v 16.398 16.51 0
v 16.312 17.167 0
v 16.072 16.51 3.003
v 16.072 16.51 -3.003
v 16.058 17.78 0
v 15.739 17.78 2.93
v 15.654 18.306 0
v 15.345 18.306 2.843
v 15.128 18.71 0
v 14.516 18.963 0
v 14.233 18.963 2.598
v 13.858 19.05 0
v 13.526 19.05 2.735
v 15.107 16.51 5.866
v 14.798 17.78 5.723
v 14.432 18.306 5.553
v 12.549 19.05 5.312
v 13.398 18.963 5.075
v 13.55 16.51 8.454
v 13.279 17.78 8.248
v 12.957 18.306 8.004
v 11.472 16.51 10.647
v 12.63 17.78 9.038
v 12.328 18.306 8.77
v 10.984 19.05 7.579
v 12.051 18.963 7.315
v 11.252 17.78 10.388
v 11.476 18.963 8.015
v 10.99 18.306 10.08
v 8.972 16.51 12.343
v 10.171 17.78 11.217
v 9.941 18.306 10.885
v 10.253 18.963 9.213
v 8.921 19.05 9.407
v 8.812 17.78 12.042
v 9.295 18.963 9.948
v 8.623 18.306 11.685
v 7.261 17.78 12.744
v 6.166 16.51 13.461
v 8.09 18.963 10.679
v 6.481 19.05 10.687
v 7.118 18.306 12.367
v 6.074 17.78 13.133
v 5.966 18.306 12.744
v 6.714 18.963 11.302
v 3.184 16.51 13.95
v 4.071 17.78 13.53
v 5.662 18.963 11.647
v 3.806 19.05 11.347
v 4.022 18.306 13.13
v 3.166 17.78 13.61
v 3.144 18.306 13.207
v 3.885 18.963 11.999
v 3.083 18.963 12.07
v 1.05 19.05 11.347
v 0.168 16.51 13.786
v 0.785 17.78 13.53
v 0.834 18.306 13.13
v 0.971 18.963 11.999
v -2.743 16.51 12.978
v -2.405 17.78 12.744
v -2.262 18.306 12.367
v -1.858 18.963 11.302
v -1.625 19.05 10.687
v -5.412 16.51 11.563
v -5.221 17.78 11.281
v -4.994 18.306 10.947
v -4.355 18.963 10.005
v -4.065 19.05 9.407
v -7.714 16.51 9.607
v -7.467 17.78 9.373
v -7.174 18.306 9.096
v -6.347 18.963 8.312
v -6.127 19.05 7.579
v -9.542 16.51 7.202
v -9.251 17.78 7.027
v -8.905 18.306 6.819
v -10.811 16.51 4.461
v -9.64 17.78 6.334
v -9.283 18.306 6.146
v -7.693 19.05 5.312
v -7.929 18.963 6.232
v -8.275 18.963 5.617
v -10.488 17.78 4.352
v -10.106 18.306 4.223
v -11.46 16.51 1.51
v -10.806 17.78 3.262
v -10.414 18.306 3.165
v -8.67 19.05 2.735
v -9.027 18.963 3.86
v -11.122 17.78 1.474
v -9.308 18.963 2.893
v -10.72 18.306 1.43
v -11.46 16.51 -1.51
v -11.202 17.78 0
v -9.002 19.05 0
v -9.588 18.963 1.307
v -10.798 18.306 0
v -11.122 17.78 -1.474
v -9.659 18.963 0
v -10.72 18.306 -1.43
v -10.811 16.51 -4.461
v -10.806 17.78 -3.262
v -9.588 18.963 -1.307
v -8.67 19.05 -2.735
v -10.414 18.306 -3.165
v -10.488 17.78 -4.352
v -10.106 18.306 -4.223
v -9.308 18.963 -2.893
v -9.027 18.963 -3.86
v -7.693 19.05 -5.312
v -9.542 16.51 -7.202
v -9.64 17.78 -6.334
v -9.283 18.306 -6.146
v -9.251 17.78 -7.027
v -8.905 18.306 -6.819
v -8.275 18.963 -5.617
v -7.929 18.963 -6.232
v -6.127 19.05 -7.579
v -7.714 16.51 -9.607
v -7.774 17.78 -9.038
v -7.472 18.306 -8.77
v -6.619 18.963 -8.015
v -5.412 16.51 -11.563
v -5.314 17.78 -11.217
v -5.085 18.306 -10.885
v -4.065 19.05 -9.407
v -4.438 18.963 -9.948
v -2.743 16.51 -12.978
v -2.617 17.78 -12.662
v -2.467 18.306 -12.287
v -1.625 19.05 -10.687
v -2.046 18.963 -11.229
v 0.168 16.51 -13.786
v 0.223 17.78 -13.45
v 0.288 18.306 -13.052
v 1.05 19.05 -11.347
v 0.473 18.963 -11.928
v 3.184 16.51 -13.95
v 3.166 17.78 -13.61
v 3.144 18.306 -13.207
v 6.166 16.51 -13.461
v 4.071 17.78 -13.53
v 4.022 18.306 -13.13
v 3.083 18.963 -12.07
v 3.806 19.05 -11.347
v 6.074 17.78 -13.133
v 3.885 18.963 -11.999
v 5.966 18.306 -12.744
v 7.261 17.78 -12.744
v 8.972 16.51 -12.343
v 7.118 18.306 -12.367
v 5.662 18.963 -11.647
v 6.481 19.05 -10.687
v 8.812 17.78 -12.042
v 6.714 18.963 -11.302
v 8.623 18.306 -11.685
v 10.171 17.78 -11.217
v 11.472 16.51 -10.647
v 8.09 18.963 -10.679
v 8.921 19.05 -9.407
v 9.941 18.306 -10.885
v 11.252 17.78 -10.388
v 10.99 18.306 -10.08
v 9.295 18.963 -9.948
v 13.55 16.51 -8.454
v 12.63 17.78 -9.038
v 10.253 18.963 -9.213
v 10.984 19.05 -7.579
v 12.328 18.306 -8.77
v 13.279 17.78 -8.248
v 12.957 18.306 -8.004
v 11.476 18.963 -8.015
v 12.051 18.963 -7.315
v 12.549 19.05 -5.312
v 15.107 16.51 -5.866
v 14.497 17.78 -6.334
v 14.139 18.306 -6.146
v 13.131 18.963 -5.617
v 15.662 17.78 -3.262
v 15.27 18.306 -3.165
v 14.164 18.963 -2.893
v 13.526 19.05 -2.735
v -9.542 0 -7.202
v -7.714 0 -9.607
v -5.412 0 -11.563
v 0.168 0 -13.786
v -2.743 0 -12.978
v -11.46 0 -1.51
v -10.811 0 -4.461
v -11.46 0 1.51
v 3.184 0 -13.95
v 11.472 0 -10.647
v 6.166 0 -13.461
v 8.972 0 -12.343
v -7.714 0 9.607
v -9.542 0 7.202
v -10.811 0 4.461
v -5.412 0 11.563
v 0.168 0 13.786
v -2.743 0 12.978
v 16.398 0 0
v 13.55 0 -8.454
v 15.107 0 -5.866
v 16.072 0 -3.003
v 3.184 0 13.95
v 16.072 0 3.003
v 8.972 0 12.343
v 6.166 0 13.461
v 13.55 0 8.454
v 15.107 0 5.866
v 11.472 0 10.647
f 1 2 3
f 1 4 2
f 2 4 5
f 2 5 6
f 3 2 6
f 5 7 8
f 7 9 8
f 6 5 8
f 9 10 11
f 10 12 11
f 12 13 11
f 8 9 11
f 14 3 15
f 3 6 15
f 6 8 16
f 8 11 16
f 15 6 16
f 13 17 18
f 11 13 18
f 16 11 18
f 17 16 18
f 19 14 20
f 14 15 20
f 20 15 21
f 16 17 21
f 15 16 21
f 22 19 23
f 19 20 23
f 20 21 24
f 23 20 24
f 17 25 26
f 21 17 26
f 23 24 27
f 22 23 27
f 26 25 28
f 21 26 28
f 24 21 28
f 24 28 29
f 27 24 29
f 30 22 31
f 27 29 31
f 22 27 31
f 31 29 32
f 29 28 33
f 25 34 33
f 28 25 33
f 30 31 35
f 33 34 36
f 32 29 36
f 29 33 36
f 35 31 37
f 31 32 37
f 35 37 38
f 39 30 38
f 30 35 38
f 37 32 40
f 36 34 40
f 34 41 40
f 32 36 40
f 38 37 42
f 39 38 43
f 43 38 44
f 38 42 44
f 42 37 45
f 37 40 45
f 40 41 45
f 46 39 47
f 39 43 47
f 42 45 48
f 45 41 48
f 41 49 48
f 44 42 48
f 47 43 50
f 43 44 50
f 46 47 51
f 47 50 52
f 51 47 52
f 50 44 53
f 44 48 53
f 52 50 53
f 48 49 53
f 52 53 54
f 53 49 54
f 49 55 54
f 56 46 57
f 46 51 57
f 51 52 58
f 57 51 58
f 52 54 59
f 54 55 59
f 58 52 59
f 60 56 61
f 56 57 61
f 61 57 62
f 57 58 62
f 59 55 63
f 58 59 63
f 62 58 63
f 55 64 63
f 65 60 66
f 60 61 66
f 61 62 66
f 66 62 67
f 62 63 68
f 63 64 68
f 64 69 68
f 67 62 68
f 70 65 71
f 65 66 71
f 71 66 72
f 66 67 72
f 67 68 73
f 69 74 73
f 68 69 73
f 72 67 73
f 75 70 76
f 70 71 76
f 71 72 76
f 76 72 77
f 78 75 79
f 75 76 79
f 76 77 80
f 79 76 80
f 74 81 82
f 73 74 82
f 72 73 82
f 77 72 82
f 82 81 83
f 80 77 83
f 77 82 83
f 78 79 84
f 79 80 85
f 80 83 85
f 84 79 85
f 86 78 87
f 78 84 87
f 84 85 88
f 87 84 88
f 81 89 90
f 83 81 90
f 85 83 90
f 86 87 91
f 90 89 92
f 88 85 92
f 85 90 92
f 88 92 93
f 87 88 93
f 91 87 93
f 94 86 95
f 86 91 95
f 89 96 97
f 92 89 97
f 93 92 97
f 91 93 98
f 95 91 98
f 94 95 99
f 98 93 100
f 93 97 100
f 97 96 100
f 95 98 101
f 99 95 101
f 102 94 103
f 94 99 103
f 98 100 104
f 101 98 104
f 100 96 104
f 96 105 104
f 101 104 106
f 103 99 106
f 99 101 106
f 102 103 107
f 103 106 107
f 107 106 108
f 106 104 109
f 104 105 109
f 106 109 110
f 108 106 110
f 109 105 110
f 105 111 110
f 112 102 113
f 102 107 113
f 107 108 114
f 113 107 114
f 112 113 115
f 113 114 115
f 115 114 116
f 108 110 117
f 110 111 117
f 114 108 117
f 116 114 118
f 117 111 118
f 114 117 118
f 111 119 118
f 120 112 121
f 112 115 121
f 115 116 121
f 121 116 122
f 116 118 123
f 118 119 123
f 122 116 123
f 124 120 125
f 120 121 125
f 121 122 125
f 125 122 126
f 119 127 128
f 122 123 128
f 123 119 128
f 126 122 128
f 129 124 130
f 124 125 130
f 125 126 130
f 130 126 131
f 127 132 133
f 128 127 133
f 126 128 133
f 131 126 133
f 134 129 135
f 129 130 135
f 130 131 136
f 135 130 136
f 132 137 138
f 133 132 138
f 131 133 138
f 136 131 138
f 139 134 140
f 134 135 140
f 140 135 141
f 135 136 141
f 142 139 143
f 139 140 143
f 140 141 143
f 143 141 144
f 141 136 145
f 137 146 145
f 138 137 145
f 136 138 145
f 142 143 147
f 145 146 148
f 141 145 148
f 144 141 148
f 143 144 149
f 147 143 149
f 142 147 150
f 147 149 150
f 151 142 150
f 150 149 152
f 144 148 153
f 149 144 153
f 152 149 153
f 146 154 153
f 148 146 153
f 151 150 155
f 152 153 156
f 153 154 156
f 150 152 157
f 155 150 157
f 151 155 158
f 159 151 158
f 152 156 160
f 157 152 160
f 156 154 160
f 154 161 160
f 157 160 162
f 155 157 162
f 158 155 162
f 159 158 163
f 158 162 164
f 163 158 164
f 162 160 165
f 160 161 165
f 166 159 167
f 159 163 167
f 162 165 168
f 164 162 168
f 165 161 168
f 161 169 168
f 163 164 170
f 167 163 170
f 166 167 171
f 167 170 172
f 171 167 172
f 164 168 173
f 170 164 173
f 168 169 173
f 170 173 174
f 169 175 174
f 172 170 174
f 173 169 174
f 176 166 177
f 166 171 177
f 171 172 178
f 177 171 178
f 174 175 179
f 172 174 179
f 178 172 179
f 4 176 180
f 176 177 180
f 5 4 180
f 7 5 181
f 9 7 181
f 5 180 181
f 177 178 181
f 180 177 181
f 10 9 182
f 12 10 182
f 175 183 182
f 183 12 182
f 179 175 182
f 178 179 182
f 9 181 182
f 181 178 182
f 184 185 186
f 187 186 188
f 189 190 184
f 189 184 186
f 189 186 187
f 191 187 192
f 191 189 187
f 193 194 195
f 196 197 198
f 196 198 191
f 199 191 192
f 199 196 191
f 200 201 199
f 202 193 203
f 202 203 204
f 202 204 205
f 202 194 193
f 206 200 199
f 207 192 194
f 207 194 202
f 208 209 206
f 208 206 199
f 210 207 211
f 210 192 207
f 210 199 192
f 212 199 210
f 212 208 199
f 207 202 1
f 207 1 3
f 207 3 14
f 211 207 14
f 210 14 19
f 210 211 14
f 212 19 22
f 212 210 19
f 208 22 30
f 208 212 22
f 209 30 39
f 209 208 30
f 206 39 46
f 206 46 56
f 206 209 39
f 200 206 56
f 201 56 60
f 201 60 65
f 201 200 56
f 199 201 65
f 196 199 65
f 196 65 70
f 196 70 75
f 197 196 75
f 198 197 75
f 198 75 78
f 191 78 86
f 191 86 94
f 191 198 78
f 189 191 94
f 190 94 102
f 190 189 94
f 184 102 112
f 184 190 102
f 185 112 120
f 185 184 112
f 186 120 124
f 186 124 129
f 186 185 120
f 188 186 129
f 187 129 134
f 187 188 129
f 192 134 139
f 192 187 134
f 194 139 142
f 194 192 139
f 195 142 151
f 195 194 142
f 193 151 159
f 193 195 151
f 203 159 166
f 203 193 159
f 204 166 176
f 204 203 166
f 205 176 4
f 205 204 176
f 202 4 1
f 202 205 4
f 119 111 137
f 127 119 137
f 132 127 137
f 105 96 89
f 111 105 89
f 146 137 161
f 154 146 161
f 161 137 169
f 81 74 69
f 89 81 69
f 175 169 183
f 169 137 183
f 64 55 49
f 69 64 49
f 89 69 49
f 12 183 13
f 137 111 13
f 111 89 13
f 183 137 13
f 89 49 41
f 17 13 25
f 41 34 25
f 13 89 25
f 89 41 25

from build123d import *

# Parameters (mm, degrees)
F0_R     = 13.97
F1_DEPTH = 19.05
F2_R     = 2.54


# Not quite as in the source:
# - a feature names something its author has since deleted; it is built from what else it names


with BuildPart() as f1:
    # F0 (on Front) → F1 (new body)
    with BuildSketch(Plane.XZ):
        with Locations((-63.3578656336, 0)):
            Circle(F0_R)
    extrude(amount=-F1_DEPTH)

    # F2
    f2_edges = [f1.edges().sort_by_distance(p)[0] for p in [
        (-77.327866, 19.05, 0),
    ]]
    fillet(f2_edges, radius=F2_R)


with BuildPart() as f1_1:
    # F3: moved
    add(f1.part.moved(Location((65.786, 0, 0))))


solid = f1_1.part
